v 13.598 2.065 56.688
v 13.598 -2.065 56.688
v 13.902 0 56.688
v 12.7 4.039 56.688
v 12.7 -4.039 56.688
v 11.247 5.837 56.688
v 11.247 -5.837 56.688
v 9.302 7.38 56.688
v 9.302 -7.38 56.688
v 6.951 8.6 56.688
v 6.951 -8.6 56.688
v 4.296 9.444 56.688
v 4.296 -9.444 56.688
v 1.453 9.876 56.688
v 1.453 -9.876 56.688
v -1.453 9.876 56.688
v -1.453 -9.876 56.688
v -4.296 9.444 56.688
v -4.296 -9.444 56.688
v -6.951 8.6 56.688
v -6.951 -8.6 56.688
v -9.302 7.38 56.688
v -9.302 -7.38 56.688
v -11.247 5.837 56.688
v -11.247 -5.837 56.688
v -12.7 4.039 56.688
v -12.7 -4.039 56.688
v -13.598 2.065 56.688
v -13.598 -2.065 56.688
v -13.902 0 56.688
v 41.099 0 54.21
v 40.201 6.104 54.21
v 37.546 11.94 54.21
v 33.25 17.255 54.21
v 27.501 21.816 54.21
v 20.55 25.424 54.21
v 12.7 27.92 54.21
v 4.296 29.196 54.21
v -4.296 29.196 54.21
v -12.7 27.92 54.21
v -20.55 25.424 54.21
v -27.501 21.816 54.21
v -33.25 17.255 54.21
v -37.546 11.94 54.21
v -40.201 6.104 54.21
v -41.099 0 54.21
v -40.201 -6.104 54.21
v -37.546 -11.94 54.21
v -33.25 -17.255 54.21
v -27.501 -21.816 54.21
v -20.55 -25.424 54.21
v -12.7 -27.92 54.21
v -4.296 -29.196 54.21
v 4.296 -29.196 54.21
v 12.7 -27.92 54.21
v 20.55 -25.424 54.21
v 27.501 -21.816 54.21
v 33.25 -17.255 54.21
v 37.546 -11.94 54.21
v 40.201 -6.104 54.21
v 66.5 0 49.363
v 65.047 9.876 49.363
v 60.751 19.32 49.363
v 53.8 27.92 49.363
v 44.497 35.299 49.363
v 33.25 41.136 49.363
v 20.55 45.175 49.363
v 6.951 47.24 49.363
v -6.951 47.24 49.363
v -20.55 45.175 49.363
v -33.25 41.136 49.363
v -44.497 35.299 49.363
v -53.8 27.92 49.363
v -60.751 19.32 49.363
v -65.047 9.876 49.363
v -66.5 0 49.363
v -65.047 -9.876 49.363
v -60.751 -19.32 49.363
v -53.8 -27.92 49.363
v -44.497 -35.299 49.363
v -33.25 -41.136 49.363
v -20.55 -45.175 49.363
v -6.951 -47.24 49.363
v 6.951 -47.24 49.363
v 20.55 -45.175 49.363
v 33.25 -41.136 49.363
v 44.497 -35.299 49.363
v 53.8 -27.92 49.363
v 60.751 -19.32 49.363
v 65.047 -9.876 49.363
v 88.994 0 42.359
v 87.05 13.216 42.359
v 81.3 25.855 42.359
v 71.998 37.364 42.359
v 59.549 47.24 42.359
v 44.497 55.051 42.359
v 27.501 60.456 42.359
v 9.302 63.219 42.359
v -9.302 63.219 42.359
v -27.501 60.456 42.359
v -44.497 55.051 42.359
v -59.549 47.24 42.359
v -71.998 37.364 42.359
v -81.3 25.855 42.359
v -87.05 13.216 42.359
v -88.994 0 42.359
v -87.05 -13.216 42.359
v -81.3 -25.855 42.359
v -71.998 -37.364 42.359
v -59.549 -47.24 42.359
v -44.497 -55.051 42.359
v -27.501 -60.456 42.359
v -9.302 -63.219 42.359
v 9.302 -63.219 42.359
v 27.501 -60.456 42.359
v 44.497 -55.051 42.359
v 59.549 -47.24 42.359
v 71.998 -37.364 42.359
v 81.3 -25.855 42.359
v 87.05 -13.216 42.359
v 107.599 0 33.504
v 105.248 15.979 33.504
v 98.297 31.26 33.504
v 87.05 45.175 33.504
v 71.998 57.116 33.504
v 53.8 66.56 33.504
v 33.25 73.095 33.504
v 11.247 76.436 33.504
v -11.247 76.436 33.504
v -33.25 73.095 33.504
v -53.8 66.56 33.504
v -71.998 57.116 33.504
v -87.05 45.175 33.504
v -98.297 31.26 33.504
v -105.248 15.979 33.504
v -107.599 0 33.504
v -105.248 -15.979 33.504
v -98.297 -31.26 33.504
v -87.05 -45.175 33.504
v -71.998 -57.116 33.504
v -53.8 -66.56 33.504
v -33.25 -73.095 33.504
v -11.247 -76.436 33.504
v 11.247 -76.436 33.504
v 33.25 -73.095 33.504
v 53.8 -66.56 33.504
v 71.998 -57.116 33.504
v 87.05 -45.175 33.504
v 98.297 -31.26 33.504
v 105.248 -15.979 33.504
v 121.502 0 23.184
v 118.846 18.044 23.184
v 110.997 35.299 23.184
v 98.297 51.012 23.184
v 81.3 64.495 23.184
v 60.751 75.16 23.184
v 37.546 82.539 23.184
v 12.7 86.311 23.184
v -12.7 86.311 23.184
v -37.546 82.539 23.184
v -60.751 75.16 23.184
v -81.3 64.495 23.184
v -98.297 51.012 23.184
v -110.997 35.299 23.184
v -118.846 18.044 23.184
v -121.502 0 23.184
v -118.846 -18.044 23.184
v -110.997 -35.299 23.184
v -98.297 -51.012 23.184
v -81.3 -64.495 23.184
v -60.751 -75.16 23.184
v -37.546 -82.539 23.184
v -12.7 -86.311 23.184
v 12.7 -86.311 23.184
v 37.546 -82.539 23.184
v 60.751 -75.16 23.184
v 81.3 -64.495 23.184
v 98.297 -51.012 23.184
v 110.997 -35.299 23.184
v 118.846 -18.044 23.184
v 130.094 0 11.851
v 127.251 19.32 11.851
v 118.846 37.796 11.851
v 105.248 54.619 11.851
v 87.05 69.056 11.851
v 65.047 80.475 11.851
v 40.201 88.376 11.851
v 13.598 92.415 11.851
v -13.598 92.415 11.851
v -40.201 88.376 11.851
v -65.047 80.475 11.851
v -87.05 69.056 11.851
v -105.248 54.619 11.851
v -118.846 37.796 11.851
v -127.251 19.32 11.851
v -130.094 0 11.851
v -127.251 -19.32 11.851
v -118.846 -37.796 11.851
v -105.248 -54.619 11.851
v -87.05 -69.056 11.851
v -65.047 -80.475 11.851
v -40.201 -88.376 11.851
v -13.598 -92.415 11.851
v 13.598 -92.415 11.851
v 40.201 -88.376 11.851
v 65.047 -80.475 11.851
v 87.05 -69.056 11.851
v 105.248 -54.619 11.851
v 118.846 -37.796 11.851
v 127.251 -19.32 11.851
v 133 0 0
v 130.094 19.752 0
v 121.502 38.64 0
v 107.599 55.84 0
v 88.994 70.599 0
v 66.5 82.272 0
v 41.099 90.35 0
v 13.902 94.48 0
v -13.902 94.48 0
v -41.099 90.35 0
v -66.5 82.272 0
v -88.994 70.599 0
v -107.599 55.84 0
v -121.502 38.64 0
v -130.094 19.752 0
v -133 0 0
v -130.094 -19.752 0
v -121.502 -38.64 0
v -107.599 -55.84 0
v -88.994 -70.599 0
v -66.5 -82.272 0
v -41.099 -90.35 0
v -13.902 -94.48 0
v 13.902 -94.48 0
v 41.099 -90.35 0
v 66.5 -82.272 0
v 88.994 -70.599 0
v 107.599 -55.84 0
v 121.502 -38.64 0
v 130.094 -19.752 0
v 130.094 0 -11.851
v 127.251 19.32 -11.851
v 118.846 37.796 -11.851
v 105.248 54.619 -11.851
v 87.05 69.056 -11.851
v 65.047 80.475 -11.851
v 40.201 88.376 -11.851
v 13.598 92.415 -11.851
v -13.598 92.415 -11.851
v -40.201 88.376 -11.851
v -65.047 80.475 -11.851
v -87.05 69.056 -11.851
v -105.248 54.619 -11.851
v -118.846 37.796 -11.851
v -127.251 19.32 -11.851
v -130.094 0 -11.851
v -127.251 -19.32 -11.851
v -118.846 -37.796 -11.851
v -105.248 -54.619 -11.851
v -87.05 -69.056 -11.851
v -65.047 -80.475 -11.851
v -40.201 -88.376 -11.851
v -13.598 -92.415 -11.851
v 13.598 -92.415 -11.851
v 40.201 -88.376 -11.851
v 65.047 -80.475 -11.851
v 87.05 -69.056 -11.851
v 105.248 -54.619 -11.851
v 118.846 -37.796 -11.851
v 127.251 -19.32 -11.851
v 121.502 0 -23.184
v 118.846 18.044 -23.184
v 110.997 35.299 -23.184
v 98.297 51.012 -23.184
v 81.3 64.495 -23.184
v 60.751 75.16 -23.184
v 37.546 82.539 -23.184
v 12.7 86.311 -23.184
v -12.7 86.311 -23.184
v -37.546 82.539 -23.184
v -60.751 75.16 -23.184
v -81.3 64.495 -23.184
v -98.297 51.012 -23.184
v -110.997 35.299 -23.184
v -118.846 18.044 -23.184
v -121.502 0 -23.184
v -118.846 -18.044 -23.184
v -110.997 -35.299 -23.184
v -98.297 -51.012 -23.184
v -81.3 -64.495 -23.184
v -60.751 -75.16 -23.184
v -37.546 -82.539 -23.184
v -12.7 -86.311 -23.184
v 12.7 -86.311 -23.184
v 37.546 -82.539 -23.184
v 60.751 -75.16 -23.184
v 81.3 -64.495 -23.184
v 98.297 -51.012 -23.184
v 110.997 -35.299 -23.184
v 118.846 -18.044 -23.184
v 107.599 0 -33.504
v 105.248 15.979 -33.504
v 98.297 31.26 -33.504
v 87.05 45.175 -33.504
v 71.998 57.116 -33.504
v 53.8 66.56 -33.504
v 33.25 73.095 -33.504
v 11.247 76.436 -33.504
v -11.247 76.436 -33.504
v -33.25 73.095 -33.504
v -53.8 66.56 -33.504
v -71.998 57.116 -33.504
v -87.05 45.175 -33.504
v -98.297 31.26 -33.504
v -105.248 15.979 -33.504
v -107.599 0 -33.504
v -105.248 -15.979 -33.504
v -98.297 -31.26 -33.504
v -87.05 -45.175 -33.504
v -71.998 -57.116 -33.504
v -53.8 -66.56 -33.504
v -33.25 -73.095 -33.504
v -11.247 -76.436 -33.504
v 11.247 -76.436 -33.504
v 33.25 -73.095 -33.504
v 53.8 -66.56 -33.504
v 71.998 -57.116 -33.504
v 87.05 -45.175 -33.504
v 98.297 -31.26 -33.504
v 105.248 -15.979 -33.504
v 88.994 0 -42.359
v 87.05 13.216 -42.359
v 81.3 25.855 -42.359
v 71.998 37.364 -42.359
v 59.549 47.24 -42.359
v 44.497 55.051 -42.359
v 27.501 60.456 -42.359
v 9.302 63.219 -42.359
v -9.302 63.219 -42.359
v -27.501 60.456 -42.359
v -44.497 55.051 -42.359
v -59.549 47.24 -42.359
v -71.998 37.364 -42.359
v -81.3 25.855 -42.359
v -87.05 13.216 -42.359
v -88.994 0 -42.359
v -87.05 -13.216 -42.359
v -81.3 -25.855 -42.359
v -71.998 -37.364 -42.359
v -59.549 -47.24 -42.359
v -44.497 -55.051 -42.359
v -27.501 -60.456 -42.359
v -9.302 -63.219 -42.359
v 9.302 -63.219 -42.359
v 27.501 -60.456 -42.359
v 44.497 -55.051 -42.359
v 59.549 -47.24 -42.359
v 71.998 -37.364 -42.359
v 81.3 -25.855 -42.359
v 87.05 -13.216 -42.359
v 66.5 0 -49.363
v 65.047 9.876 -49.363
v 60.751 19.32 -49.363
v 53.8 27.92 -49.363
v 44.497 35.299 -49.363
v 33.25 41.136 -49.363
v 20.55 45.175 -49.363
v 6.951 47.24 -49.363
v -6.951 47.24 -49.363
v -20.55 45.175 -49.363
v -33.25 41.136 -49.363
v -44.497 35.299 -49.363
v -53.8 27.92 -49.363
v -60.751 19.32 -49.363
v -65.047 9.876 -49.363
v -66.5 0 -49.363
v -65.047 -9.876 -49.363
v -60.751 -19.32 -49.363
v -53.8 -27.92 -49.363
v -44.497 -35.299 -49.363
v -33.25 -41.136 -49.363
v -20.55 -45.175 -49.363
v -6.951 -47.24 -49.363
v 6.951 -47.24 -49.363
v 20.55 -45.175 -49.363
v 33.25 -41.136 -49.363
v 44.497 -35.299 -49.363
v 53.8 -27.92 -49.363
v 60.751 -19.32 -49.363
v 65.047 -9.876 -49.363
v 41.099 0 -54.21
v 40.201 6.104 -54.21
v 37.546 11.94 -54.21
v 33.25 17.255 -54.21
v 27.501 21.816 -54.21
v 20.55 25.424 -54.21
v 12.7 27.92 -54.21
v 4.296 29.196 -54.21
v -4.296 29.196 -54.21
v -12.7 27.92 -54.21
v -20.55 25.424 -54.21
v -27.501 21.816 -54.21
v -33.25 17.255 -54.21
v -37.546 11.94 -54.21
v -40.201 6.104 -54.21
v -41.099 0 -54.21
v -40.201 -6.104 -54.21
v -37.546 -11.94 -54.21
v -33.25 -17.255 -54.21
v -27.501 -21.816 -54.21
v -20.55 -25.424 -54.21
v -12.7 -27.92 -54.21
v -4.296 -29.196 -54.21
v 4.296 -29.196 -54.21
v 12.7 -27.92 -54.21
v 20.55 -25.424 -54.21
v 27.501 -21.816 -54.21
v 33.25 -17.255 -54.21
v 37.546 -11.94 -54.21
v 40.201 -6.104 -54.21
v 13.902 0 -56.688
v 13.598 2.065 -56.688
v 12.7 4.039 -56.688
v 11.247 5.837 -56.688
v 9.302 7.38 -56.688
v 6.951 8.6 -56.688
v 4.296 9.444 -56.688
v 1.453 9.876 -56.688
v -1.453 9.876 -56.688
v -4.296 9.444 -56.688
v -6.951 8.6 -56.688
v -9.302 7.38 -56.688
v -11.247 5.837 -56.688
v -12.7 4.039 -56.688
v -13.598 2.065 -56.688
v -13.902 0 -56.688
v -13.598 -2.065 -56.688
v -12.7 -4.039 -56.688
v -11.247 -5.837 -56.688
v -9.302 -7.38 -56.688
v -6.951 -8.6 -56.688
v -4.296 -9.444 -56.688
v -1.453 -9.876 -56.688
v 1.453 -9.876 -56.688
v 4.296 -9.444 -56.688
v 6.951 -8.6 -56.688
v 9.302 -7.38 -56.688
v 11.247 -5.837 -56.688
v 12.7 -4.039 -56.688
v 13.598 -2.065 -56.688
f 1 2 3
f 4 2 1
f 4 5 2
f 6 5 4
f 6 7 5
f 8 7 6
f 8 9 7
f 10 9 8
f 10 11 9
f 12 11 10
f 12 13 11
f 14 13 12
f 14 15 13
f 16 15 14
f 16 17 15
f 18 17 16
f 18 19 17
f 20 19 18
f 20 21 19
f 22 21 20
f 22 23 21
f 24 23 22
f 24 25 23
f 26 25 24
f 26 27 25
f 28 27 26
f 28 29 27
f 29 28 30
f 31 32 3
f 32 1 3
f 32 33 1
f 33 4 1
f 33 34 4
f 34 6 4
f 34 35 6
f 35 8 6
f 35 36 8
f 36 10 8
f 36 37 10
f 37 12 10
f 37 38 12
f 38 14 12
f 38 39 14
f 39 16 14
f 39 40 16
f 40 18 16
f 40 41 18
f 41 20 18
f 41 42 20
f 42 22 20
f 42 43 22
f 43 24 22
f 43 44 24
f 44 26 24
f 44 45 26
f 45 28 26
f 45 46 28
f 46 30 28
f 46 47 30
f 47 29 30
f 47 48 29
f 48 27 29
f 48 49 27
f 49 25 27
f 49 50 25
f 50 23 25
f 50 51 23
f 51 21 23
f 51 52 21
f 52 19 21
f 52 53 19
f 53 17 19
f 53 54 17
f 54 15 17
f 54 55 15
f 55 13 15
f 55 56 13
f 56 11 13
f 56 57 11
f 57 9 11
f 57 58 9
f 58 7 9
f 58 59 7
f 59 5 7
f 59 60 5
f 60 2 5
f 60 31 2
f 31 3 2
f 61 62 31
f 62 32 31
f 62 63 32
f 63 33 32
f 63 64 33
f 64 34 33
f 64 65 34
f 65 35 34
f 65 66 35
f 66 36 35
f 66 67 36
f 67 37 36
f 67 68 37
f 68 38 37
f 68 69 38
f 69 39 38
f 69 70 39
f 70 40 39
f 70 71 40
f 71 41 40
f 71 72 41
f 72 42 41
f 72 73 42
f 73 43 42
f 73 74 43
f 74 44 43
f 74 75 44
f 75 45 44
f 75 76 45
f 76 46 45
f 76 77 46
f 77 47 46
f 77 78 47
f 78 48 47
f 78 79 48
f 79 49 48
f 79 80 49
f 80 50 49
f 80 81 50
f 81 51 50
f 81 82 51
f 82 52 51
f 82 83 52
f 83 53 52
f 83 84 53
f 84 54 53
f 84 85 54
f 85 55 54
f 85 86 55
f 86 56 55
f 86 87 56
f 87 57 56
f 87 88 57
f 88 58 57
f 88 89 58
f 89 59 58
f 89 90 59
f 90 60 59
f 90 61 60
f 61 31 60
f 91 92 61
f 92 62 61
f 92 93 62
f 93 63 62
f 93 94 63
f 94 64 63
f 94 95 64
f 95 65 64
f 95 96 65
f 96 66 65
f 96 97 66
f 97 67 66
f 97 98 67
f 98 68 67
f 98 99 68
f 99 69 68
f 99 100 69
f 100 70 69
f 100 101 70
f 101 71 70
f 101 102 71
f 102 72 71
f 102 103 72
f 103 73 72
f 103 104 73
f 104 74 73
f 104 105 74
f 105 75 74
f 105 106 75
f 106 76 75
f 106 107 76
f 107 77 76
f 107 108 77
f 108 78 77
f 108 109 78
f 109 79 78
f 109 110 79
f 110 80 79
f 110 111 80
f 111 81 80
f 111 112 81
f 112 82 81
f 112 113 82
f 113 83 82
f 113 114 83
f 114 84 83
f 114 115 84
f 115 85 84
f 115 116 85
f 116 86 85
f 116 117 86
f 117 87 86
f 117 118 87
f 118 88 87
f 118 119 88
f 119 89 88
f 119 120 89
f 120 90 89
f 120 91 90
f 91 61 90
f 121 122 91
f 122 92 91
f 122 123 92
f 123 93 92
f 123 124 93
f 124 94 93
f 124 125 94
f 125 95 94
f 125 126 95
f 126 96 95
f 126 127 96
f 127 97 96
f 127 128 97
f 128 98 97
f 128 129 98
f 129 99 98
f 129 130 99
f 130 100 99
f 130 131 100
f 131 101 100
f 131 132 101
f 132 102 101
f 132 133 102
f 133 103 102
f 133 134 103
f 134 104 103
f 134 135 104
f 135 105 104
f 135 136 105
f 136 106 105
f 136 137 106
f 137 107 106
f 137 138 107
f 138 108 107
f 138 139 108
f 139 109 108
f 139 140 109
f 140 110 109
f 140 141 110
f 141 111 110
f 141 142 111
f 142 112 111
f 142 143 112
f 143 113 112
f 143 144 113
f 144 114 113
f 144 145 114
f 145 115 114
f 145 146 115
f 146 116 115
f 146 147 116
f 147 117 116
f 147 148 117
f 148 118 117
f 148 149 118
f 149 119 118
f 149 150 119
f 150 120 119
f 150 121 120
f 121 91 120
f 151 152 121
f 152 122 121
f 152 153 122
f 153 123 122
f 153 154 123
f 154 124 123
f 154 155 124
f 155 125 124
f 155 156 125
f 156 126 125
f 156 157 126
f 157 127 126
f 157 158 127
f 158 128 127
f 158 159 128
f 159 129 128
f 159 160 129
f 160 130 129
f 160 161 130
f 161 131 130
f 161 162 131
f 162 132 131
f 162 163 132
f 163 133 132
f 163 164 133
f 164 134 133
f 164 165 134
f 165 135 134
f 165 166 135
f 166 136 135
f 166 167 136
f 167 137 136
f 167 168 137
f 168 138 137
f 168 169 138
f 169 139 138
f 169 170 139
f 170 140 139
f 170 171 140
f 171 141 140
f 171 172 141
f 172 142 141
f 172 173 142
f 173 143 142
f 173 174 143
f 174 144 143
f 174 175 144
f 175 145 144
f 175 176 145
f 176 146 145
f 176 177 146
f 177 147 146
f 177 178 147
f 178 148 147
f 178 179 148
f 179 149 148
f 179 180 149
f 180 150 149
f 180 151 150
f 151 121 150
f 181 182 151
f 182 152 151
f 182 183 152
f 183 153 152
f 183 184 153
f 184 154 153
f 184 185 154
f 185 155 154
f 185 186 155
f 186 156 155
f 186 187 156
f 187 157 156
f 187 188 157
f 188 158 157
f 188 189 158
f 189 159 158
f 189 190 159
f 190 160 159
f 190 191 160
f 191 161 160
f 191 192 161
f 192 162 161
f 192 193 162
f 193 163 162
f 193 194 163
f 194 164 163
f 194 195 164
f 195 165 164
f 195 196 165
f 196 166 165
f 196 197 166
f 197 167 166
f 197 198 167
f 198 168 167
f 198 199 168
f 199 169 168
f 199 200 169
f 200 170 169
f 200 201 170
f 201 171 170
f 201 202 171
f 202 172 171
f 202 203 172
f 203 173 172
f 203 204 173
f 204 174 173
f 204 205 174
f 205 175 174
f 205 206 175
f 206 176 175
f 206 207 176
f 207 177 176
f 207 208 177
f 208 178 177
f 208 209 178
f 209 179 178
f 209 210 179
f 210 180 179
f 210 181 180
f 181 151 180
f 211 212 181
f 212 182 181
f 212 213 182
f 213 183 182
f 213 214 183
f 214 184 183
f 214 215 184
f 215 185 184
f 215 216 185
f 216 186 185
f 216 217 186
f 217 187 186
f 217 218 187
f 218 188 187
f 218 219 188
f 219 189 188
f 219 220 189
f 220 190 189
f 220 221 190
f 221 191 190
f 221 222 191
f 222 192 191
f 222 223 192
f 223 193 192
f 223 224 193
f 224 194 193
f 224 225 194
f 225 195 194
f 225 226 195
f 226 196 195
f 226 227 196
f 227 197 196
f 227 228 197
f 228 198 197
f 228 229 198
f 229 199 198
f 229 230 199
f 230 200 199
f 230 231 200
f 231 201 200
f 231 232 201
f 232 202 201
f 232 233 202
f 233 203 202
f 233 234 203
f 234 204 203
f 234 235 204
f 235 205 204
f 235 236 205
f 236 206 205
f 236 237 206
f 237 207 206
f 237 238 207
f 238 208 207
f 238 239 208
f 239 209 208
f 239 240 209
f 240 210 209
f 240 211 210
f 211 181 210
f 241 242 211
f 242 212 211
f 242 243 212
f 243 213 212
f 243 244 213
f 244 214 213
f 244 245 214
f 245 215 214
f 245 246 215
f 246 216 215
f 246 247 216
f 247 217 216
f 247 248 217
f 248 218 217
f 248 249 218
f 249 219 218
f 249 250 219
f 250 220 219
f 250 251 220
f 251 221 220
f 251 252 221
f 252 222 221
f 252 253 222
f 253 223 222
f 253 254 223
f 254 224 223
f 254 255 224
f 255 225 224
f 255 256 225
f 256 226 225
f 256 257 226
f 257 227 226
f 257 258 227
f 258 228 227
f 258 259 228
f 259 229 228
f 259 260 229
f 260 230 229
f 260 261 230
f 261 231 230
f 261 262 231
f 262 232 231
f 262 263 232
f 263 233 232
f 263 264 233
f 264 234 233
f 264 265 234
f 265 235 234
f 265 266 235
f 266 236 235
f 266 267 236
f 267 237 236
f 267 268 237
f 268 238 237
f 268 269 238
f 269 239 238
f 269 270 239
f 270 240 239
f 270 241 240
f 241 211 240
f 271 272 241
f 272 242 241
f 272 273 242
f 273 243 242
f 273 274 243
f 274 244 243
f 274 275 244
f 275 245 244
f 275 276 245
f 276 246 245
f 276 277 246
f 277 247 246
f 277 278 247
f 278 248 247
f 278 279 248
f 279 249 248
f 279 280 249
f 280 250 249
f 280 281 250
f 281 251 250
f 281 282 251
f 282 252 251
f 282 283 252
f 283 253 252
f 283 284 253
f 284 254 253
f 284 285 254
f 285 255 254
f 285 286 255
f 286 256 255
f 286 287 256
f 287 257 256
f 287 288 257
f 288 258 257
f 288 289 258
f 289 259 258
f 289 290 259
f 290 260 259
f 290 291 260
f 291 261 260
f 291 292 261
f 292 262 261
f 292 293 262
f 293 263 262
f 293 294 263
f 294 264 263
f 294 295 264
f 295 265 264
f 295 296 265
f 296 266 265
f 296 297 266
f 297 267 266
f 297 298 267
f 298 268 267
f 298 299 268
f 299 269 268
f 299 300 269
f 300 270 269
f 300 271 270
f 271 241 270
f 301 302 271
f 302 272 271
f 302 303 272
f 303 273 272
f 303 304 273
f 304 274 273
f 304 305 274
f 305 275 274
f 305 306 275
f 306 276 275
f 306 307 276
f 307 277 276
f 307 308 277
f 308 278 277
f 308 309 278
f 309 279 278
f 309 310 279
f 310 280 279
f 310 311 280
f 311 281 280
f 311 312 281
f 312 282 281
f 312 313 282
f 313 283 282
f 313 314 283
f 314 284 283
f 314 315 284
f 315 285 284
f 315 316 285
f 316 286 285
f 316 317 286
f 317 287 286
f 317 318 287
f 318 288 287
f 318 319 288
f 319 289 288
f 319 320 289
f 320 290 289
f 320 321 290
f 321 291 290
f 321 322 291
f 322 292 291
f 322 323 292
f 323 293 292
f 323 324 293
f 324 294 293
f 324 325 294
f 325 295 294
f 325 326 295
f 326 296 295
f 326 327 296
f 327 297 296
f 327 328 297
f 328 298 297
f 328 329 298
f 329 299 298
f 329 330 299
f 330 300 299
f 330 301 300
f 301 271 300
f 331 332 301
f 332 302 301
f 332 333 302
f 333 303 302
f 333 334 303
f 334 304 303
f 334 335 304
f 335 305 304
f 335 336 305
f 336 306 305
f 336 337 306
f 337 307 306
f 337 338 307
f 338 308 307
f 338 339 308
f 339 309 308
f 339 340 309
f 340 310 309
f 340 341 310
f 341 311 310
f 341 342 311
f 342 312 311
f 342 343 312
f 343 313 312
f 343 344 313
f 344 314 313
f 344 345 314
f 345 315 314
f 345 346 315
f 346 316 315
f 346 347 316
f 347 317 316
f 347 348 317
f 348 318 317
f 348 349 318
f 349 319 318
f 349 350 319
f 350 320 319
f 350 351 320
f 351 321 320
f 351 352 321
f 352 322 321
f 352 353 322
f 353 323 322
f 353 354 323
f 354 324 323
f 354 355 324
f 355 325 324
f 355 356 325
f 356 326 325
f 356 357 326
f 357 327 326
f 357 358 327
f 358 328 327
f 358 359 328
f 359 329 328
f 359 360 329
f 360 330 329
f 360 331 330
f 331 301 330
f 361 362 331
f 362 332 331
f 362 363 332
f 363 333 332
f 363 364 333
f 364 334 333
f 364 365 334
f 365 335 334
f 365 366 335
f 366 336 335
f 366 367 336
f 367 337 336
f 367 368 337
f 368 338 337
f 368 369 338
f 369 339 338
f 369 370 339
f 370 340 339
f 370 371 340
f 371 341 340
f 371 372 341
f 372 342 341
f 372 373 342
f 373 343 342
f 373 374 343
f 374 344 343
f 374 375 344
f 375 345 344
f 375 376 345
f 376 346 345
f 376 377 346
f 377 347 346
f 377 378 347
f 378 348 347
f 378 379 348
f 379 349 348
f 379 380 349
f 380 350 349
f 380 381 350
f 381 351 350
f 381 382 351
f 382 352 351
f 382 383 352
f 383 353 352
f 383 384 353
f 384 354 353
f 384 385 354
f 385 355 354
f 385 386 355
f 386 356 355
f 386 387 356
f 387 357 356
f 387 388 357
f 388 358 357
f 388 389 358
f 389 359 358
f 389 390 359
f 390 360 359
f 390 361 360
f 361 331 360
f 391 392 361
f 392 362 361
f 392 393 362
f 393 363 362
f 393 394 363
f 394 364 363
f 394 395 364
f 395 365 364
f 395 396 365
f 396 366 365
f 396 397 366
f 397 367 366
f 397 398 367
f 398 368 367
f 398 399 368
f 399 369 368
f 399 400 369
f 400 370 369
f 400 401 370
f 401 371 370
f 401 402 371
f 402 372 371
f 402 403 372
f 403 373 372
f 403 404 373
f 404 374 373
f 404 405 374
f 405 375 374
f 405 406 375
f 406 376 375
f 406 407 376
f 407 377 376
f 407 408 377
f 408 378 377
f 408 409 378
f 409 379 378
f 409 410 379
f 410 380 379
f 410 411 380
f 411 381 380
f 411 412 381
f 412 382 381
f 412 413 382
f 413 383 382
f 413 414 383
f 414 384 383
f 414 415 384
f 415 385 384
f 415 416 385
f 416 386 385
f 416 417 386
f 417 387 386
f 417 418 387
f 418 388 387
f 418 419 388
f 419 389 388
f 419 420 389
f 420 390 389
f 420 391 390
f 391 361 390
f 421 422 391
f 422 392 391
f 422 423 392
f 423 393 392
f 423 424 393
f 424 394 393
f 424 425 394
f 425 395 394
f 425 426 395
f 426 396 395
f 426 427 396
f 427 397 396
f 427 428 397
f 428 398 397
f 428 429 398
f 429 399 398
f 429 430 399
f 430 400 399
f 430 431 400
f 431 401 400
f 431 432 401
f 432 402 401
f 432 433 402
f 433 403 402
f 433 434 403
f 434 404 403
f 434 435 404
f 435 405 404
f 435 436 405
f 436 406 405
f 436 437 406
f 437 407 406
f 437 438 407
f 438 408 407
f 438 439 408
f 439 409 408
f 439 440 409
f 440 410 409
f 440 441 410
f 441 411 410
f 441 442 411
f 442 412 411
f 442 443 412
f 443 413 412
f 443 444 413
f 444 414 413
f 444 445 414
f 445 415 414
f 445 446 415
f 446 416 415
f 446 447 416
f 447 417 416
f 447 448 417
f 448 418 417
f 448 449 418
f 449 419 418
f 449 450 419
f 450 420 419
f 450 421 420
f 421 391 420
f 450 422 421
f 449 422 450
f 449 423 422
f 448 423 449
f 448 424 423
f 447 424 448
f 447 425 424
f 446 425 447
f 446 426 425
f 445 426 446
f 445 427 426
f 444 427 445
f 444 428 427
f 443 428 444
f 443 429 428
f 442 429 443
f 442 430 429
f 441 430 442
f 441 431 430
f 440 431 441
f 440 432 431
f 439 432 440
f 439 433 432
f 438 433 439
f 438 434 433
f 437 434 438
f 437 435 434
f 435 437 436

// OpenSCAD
// Generated by SolidPython 1.0.1 on 2020-07-29 00:46:47


scale(v = [7, 5, 3]) {
	sphere(r = 19);
}
/***********************************************
*********      SolidPython code:      **********
************************************************
 
# import packages: SolidPython
from solid import *
from solid.utils import *
from itertools import chain, combinations, permutations


class Resize:

    def __init__(self, scad_file):
        self.scad_file = scad_file
        #self.scad_file = import_scad(scad_file)
        # cone/cylinder param:
        self.r1 = 0
        self.r2 = 0
        self.h = 0
        # rectangular prism param:
        self.w = 0
        self.l = 0
        # ellipse param:
        self.r = 0

    # import OpenScad code (file name corresponds to shape)


    # classify shape + parameters
    def assign(self, param1, param2, param3):
        if self.scad_file == 'cone.scad':
            self.r1 = param1
            self.r2 = param2
            self.h = param3
        elif self.scad_file == 'cylinder.scad':
            self.r1 = param1
            self.r2 = param2
            self.h = param3
        elif self.scad_file == 'rectangularPrism.scad':
            self.h = param1
            self.l = param2
            self.w = param3
        else:
            self.r = param1
            self.h = param2

    # resize parameters
    def iterate(self):
        x = range(3, 20, 2)
        i = 1
        if self.scad_file == 'cone.scad':
            tempList = list(permutations(x, 2))
            for temp in tempList:
                param1 = temp[0]
                param2 = temp[1]
                filepath = 'produced_scad_files/' + 'cone' + str(param1) + '_' + str(param2) + '_' + '.scad'
                scad_render_to_file(cylinder(h=param1, r1=param2, r2=0), filepath)

        elif self.scad_file == 'cylinder.scad':
            tempList = list(permutations(x, 3))
            for temp in tempList:
                param1 = temp[0]
                param2 = temp[1]
                filepath = 'produced_scad_files/' + 'cylinder' + str(param1) + '_' + str(param2) + '_' + '.scad'
                scad_render_to_file(cylinder(h=param1, r1=param2, r2=param2), filepath)

        elif self.scad_file == 'rectangularPrism.scad':
            tempList = list(permutations(x, 3))
            for temp in tempList:
                param1 = temp[0]
                param2 = temp[1]
                param3 = temp[2]
                filepath = 'produced_scad_files/' + 'rectangularPrism' + str(param1) + '_' + str(param2) + '_' + str(
                    param3) + '.scad'
                scad_render_to_file(cube(size=(param1, param2, param3)), filepath)

        elif self.scad_file == 'ellipse.scad':
            tempList = list(permutations(x, 4))
            for temp in tempList:
                param1 = temp[0]
                param2 = temp[1]
                param3 = temp[2]
                param4 = temp[3]
                filepath = 'produced_scad_files/' + 'ellipse' + str(param1) + '_' + str(param2) + '_' + str(param3) + '_' + str(param4) + '.scad'
                scad_render_to_file(scale([param1, param2, param3])(sphere(r=param4)), filepath)

    def render_to_scadfile(self):
        scad_render_to_file(scad, 'example.scad') 
 
************************************************/
